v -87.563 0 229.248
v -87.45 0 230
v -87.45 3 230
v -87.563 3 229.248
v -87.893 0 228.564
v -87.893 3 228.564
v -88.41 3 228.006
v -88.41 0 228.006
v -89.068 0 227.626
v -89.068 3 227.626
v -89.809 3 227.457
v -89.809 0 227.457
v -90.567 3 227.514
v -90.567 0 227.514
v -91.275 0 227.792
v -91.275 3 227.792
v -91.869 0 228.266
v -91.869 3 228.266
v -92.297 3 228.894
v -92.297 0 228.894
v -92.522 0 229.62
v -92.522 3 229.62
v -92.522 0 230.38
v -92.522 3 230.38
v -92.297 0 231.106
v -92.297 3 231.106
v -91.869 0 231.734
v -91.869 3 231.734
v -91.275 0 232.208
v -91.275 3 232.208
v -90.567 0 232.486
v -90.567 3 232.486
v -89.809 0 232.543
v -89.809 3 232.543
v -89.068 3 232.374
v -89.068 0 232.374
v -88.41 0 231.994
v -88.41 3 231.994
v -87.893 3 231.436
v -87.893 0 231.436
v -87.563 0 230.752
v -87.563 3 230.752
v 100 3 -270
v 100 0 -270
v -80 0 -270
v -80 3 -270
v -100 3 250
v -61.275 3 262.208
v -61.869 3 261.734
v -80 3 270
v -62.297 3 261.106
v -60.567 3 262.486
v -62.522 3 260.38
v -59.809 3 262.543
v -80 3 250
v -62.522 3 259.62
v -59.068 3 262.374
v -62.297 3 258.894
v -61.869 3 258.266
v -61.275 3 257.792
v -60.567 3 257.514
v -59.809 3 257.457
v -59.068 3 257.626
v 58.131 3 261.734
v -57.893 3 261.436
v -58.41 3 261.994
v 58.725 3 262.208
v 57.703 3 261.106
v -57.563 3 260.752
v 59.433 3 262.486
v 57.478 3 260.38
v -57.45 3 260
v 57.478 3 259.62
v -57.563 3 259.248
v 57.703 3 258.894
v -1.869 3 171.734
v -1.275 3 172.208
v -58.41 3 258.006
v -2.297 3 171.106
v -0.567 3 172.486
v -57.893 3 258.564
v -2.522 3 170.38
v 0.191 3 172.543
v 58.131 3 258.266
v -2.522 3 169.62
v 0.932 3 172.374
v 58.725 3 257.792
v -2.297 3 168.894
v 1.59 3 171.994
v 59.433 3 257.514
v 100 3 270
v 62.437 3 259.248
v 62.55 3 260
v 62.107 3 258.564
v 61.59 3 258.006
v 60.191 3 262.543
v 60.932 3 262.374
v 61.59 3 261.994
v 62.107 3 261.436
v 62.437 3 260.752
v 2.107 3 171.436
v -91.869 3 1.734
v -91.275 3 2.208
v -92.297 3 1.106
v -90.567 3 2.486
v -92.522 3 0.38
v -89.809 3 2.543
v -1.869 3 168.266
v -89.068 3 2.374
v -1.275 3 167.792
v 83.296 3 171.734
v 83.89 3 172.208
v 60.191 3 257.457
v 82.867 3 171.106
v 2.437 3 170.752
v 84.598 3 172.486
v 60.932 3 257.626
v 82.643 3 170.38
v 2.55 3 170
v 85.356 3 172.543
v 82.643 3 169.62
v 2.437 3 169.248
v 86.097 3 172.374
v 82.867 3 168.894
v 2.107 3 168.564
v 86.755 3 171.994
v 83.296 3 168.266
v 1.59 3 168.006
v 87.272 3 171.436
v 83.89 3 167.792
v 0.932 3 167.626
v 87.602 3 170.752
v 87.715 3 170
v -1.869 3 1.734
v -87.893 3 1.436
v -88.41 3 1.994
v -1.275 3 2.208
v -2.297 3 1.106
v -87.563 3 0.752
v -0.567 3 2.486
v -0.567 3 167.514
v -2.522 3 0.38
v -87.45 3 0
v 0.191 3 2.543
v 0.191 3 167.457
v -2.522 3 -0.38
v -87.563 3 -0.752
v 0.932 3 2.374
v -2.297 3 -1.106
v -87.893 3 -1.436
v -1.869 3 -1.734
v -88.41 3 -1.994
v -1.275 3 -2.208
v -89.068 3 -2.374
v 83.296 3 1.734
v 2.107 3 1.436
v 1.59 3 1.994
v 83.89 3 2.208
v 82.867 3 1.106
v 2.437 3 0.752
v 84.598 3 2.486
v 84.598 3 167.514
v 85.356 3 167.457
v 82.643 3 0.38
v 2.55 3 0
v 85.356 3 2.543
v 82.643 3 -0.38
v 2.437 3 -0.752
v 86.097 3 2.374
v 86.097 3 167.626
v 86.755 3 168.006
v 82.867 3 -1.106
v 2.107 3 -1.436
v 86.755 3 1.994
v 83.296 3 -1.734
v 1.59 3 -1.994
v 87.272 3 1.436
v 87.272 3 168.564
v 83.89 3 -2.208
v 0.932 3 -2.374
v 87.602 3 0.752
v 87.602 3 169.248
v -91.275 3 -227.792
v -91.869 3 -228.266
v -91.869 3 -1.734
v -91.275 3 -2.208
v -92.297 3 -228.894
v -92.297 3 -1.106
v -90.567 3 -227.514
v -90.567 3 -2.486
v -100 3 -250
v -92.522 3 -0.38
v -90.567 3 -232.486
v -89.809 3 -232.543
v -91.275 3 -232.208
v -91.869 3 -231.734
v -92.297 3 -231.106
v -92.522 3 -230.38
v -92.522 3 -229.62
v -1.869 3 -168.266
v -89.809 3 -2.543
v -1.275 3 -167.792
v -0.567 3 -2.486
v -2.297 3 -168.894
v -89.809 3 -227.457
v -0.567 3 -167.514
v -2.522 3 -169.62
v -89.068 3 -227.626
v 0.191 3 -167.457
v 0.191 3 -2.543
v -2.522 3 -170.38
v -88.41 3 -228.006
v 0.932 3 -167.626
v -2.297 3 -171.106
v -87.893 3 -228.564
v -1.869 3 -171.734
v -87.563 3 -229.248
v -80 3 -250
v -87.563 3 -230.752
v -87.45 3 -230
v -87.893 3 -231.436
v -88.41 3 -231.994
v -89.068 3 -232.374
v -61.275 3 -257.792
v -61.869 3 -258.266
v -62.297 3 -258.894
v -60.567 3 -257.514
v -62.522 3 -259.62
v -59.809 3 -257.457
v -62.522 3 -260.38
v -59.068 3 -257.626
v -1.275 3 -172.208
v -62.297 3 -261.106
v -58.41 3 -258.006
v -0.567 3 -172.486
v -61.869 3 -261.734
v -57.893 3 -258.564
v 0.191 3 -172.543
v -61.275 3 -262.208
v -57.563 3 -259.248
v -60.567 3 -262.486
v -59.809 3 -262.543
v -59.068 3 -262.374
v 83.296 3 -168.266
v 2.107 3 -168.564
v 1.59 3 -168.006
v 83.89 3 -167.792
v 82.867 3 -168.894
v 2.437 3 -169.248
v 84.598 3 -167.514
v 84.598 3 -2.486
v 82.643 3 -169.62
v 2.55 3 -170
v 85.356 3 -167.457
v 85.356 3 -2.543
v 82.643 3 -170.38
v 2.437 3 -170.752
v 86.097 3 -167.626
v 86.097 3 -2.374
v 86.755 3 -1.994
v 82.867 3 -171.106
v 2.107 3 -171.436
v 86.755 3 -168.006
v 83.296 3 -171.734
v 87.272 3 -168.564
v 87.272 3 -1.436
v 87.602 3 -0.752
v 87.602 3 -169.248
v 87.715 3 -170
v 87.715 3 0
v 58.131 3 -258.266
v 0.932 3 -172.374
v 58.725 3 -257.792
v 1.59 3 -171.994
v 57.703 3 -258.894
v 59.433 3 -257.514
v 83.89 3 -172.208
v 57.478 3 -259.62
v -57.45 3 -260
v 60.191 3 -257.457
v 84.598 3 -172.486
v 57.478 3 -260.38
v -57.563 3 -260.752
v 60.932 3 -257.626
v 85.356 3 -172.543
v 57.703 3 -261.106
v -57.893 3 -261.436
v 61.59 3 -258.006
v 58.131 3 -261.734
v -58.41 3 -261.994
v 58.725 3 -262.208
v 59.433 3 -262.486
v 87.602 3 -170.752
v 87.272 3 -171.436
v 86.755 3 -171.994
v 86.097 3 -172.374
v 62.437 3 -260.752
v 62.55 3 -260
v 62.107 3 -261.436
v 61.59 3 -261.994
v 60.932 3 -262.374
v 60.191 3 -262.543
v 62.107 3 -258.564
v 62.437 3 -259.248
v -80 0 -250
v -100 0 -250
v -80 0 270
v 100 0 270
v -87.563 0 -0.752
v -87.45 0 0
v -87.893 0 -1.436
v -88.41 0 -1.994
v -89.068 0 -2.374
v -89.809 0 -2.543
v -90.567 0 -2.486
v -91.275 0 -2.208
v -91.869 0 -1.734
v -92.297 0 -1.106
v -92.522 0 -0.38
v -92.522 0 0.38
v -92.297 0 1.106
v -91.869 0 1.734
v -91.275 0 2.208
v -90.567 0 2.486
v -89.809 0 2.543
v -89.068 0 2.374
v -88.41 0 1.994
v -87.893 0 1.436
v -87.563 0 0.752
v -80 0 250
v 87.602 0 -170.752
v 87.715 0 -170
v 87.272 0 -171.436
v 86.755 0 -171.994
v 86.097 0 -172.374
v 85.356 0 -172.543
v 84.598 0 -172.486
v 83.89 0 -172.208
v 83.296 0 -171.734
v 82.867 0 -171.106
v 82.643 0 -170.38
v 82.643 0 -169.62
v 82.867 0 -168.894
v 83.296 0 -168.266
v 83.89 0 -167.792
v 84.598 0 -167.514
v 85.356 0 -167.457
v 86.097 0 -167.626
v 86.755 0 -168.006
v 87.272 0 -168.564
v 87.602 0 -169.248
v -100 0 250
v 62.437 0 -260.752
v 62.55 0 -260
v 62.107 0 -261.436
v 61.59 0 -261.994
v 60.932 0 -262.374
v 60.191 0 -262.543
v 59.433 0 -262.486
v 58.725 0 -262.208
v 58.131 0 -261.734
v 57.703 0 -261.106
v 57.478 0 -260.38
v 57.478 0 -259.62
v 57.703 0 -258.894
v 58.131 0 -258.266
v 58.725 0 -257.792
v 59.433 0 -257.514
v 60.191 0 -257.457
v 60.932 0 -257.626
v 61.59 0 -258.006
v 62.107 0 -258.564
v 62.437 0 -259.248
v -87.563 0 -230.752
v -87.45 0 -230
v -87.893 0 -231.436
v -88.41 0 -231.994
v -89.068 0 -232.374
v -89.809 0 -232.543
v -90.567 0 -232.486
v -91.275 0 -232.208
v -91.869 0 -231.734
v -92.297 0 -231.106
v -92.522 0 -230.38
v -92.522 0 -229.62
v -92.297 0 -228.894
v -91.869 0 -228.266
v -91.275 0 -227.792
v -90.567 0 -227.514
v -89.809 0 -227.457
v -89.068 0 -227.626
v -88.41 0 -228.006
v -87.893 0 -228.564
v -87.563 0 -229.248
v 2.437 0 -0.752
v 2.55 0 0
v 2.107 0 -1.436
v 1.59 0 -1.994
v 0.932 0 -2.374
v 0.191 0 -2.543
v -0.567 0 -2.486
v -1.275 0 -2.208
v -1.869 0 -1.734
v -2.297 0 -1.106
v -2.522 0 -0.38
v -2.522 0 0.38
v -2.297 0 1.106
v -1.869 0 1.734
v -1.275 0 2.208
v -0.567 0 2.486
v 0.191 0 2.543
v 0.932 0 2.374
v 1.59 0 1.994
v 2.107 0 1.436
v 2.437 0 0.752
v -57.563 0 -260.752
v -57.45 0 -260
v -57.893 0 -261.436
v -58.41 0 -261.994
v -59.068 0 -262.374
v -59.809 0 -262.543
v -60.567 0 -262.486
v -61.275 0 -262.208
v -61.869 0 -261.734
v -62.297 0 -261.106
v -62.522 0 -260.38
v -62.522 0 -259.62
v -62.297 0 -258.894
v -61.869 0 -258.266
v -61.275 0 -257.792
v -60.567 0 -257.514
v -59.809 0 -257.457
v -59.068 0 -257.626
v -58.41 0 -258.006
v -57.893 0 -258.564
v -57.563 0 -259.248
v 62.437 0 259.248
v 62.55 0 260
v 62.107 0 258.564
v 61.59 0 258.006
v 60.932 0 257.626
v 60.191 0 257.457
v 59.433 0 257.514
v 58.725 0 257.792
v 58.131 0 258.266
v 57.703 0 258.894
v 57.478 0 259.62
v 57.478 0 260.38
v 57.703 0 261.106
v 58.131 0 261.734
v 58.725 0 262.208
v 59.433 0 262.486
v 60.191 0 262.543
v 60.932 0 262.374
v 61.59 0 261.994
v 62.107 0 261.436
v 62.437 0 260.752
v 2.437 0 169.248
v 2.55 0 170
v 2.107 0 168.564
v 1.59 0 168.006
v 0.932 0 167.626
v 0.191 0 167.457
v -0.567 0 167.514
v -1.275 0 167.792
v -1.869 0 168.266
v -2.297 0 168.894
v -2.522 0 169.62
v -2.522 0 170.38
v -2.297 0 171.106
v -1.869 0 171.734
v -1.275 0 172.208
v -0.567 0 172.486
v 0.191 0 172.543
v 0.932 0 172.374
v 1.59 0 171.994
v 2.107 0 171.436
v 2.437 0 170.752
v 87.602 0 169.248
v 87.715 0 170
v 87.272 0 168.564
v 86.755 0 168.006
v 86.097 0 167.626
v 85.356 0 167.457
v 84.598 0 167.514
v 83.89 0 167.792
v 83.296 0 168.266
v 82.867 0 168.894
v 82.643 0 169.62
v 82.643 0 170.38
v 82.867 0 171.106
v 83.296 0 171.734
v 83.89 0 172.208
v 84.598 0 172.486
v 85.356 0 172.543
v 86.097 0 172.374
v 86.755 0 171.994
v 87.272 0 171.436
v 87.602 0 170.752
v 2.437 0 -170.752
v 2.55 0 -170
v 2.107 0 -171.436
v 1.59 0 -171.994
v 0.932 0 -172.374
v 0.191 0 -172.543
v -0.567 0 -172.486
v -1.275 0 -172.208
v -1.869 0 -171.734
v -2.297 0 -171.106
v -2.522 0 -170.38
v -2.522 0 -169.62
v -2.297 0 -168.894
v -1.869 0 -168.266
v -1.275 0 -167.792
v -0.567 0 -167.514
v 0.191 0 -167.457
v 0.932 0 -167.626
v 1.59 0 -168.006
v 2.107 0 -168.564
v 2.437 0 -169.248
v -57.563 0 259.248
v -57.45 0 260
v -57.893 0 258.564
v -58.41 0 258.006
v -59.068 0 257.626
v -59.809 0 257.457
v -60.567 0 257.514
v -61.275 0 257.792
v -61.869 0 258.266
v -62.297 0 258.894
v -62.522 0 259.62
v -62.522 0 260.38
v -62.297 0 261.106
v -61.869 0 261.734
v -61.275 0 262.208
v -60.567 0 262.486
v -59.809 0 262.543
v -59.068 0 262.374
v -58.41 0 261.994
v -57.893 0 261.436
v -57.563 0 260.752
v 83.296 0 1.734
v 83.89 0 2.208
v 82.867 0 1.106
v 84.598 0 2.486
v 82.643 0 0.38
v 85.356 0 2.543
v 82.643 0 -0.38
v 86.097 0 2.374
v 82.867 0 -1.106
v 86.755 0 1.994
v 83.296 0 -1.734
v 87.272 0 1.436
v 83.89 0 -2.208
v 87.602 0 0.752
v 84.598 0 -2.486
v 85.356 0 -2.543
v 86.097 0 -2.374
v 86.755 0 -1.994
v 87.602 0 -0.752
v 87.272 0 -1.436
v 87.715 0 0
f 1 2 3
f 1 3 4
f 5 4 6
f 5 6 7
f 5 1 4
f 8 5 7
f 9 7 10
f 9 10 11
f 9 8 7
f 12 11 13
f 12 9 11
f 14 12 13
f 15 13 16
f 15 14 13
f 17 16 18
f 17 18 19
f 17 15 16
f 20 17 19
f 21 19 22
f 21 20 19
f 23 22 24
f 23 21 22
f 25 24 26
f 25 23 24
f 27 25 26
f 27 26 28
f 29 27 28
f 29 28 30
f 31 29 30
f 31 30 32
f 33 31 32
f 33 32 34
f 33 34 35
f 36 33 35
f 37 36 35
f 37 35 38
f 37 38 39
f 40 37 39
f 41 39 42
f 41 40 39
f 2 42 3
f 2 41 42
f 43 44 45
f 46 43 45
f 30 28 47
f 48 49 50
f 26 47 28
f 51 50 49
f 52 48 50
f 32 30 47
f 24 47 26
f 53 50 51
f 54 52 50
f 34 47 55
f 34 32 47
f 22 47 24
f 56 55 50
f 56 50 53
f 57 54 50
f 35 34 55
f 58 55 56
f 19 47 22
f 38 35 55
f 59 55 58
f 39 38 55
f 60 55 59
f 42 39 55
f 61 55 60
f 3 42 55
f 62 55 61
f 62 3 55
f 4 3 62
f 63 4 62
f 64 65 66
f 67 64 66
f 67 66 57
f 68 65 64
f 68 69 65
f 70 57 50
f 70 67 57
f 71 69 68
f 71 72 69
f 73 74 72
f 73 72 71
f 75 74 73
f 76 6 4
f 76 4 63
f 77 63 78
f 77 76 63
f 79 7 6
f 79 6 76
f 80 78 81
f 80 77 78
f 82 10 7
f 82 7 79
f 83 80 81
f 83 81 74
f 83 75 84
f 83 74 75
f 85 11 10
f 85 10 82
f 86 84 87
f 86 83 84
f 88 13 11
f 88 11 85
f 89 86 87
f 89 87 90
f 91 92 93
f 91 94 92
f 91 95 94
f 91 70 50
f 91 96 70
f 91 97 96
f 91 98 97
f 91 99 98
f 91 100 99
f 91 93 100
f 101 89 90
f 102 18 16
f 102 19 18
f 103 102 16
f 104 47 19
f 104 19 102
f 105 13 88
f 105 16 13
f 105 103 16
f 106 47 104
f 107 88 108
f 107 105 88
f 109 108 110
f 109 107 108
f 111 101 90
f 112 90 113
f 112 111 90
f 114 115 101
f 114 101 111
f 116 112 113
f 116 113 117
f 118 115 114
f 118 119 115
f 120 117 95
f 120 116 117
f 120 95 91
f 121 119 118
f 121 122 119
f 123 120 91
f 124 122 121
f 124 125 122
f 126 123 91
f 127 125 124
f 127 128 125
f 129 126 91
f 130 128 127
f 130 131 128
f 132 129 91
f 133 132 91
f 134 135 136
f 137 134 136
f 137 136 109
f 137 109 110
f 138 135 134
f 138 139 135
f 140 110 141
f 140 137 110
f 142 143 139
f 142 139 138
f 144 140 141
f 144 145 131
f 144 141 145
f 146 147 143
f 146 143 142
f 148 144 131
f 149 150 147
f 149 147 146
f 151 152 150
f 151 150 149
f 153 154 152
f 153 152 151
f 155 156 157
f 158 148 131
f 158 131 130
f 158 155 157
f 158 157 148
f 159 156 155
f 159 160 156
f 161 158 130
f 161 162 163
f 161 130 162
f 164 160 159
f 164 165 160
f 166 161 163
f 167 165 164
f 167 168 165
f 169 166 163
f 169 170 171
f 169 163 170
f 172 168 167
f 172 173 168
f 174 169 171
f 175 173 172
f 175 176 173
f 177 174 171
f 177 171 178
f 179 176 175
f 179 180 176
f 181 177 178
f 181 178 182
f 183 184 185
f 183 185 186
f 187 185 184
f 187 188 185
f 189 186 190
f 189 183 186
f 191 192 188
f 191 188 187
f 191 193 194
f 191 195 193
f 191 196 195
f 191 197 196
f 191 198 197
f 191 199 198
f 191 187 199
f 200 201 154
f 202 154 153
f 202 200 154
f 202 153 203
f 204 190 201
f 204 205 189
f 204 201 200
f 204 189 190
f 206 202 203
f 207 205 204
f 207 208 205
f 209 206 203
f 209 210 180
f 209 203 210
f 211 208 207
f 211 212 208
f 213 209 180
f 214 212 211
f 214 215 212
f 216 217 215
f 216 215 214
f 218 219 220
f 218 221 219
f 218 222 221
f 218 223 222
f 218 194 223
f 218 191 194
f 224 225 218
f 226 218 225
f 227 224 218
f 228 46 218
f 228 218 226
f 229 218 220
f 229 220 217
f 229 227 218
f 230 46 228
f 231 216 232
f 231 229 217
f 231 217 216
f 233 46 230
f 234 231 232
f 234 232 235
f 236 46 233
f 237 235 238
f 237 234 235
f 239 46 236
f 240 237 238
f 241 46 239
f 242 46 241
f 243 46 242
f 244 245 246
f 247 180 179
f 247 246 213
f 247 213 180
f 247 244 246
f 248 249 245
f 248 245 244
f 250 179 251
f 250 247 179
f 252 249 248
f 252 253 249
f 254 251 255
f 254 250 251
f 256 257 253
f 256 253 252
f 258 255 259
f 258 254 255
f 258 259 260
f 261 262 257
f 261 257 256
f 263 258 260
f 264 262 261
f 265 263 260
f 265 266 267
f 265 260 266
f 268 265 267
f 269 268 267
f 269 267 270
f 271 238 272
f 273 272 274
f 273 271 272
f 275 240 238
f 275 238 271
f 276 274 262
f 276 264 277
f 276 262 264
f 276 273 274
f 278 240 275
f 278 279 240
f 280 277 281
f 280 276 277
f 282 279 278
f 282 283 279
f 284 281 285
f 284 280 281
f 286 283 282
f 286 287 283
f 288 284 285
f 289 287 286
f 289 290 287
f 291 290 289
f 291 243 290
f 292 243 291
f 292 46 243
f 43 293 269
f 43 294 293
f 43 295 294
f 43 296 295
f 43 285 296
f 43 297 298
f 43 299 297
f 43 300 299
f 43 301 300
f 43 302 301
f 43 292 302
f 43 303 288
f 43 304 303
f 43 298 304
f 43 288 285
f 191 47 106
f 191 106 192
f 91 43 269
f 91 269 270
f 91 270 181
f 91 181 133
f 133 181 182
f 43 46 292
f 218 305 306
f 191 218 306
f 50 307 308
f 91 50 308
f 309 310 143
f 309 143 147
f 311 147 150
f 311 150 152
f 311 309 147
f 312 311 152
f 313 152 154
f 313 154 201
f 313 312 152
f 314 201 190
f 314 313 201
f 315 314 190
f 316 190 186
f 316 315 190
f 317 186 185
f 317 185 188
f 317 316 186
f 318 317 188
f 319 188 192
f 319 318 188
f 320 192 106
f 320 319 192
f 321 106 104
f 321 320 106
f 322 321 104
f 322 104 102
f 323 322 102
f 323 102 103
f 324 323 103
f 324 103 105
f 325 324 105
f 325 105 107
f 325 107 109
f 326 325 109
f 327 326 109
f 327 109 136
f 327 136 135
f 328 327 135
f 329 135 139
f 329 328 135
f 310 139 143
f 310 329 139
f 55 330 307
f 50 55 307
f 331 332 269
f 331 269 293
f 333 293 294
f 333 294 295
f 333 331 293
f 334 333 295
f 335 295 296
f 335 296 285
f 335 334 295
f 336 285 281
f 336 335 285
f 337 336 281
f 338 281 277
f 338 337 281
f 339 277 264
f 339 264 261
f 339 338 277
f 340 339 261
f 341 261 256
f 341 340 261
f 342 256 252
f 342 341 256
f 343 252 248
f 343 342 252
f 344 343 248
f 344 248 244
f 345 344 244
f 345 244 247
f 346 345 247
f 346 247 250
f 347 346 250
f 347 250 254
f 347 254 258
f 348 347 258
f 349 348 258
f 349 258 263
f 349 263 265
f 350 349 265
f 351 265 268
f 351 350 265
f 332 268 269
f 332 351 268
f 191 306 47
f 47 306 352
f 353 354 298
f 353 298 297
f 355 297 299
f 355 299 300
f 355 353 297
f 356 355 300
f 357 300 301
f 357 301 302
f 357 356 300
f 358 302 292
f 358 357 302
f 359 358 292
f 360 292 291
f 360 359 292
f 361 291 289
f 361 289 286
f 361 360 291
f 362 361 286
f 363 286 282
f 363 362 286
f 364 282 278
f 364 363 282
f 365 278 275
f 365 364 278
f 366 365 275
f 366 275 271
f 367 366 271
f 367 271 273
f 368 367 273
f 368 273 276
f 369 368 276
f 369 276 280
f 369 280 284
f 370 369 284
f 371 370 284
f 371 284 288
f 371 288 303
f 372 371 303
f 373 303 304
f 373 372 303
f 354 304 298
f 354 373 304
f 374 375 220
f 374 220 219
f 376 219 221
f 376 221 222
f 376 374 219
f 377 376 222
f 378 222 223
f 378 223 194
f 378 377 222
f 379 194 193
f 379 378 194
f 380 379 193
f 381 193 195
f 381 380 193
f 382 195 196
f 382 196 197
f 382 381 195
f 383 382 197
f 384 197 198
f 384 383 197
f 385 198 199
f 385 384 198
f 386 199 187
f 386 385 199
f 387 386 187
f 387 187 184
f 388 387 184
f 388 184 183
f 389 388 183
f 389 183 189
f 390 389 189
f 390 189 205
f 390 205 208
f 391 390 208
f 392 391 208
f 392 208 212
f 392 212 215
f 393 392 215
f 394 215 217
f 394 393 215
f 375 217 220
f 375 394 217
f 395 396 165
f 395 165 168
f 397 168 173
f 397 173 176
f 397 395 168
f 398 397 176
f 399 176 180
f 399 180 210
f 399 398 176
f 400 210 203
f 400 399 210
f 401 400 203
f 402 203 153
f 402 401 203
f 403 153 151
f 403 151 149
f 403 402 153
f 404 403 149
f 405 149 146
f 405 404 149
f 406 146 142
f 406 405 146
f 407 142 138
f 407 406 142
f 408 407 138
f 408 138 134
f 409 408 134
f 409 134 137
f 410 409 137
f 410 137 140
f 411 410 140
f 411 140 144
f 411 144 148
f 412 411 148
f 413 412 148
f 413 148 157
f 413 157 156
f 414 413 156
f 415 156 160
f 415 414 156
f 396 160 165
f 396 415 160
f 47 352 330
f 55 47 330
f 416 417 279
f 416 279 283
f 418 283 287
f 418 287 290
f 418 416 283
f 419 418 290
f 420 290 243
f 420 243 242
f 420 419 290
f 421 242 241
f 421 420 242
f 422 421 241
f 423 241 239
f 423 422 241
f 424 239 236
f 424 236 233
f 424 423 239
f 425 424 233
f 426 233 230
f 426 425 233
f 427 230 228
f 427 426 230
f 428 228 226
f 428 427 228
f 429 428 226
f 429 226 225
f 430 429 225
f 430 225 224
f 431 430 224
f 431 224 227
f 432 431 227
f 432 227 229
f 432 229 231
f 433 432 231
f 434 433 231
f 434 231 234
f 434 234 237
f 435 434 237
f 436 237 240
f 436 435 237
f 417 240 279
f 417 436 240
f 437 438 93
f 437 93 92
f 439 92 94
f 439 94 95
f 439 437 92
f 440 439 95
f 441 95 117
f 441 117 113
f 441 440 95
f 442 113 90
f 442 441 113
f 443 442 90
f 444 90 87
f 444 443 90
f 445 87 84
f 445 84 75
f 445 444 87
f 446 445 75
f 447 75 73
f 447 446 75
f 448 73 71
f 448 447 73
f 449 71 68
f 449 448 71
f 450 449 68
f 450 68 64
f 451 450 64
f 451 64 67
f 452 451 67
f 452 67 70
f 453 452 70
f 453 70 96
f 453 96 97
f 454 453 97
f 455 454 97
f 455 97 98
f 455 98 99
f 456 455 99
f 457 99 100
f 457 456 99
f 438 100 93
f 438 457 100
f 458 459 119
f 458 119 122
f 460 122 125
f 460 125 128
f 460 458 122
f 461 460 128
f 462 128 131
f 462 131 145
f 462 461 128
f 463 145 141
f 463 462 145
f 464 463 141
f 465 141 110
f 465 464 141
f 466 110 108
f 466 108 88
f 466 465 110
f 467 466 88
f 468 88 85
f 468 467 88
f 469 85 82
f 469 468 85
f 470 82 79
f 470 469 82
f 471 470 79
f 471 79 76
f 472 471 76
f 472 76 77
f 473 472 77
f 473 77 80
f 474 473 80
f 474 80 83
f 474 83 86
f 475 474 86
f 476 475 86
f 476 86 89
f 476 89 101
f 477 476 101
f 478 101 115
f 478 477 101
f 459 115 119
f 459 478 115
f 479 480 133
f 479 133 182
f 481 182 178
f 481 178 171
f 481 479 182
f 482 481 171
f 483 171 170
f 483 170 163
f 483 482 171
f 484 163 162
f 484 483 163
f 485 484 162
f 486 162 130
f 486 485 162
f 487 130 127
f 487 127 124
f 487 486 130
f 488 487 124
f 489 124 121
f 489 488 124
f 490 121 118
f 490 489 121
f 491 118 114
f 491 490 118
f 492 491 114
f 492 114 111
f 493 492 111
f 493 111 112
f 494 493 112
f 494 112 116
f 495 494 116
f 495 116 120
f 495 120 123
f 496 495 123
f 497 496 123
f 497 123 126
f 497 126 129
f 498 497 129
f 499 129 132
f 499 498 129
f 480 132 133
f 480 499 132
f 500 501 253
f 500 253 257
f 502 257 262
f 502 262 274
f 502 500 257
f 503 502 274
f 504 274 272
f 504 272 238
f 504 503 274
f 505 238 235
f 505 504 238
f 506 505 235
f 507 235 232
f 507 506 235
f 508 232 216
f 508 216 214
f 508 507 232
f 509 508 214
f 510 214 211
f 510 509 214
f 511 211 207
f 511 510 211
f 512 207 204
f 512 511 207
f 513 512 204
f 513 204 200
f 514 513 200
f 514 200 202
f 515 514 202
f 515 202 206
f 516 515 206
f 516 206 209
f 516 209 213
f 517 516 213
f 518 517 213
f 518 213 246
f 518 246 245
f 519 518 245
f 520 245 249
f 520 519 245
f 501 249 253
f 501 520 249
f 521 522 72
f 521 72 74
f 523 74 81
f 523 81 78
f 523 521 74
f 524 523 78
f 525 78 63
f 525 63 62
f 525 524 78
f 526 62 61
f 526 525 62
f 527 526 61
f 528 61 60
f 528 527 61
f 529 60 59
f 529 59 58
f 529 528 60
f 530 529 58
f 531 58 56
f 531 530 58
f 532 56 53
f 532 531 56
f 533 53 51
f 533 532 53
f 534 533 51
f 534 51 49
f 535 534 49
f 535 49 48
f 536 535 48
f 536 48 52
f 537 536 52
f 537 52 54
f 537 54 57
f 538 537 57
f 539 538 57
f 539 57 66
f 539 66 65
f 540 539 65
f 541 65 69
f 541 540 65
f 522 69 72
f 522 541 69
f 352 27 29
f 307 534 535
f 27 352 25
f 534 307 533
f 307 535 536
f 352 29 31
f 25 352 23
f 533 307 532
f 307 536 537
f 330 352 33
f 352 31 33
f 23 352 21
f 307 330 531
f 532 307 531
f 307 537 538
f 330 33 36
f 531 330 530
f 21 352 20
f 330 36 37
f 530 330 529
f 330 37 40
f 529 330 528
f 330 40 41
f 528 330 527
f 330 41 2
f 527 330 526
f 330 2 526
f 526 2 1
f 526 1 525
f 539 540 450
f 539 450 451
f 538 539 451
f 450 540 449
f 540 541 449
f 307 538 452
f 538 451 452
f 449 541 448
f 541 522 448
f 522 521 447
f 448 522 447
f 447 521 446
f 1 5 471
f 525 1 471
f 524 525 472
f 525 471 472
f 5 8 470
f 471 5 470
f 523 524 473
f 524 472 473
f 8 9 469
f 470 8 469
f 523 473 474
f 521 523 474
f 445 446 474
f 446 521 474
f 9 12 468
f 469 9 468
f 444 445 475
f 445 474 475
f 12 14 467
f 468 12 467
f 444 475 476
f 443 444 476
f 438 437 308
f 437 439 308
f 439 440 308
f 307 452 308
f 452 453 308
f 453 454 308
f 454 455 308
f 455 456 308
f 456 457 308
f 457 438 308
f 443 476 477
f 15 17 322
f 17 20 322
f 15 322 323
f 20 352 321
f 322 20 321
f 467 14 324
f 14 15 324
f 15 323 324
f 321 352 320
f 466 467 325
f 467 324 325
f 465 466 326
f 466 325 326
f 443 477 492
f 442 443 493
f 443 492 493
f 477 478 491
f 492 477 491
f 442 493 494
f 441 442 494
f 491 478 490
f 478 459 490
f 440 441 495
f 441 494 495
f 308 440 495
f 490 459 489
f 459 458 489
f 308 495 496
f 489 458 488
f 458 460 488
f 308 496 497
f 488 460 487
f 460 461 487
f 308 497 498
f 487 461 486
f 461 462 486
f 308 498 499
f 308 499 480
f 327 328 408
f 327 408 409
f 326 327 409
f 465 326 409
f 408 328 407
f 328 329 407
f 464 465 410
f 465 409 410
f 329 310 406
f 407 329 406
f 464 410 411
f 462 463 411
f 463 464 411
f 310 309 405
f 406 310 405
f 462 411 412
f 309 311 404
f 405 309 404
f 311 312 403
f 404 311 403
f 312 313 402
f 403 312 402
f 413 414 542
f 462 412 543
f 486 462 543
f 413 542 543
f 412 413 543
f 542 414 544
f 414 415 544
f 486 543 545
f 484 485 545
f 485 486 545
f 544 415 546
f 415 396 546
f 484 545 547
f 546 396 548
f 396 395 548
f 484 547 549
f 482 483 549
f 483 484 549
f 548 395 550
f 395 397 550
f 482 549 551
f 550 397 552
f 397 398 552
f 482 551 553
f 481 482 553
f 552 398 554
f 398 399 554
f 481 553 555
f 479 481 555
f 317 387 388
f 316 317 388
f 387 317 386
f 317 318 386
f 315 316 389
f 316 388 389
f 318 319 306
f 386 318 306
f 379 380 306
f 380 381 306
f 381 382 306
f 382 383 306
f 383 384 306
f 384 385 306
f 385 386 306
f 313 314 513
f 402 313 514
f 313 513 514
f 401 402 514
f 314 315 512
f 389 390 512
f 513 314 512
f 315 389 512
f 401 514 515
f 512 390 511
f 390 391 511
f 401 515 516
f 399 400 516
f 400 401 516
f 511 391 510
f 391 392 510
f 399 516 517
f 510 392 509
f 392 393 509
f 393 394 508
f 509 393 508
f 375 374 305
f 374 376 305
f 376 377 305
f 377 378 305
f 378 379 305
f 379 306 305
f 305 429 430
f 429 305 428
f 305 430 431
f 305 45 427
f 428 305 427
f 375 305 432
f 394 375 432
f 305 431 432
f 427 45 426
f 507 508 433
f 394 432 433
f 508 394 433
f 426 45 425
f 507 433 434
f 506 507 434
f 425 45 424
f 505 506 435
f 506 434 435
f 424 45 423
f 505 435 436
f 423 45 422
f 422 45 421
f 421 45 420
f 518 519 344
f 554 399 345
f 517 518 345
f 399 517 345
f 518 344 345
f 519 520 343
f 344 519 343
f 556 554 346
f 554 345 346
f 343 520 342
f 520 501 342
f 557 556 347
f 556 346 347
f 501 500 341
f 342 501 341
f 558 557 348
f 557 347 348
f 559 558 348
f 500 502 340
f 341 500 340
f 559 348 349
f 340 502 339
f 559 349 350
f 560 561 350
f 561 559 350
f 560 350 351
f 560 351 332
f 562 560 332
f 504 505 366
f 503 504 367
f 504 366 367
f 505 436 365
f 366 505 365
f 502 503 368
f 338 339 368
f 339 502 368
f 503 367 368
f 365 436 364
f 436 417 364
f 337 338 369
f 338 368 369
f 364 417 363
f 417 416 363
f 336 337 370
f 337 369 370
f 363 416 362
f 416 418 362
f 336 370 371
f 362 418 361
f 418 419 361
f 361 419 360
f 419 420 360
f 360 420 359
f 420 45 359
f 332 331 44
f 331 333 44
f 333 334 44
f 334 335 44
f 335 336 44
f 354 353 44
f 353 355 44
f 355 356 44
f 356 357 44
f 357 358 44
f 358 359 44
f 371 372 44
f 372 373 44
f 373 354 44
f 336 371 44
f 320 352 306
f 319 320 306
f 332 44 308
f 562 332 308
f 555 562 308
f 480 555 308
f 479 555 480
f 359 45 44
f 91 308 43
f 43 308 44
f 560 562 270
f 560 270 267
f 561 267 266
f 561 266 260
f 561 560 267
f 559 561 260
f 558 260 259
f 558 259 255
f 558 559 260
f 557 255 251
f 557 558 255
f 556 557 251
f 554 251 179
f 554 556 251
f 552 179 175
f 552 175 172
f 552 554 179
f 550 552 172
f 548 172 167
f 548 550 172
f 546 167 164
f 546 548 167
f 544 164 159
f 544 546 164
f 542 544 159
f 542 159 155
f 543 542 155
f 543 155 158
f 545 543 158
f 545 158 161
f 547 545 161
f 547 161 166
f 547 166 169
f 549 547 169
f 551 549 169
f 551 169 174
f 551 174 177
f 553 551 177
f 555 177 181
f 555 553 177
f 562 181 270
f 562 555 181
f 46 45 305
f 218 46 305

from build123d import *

# Parameters (mm, degrees)
SKETCH1_R           = 2.55
BOSS_EXTRUDE1_DEPTH = 3


with BuildPart() as part:
    # Sketch1 → Boss-Extrude1 (new body)
    with BuildSketch(Plane(origin=(0, 0, 0), x_dir=(1, 0, 0), z_dir=(0, 1, 0))):
        Polygon((-80, 270), (-80, 250), (-100, 250), (-100, -250), (-80, -250), (-80, -270), (100, -270), (100, 270), align=None)
        with Locations((-60, 260)):
            Circle(SKETCH1_R, mode=Mode.SUBTRACT)
        with Locations((60, 260)):
            Circle(SKETCH1_R, mode=Mode.SUBTRACT)
        with Locations((-90, 230)):
            Circle(SKETCH1_R, mode=Mode.SUBTRACT)
        with Locations((-90, 0)):
            Circle(SKETCH1_R, mode=Mode.SUBTRACT)
        with Locations((-90, -230)):
            Circle(SKETCH1_R, mode=Mode.SUBTRACT)
        with Locations((60, -260)):
            Circle(SKETCH1_R, mode=Mode.SUBTRACT)
        Circle(SKETCH1_R, mode=Mode.SUBTRACT)
        with Locations((0, 170)):
            Circle(SKETCH1_R, mode=Mode.SUBTRACT)
        with Locations((0, -170)):
            Circle(SKETCH1_R, mode=Mode.SUBTRACT)
        with Locations((-60, -260)):
            Circle(SKETCH1_R, mode=Mode.SUBTRACT)
        with Locations((85.164947562, 0)):
            Circle(SKETCH1_R, mode=Mode.SUBTRACT)
        with Locations((85.164947562, 170)):
            Circle(SKETCH1_R, mode=Mode.SUBTRACT)
        with Locations((85.164947562, -170)):
            Circle(SKETCH1_R, mode=Mode.SUBTRACT)
    extrude(amount=BOSS_EXTRUDE1_DEPTH)


solid = part.part
